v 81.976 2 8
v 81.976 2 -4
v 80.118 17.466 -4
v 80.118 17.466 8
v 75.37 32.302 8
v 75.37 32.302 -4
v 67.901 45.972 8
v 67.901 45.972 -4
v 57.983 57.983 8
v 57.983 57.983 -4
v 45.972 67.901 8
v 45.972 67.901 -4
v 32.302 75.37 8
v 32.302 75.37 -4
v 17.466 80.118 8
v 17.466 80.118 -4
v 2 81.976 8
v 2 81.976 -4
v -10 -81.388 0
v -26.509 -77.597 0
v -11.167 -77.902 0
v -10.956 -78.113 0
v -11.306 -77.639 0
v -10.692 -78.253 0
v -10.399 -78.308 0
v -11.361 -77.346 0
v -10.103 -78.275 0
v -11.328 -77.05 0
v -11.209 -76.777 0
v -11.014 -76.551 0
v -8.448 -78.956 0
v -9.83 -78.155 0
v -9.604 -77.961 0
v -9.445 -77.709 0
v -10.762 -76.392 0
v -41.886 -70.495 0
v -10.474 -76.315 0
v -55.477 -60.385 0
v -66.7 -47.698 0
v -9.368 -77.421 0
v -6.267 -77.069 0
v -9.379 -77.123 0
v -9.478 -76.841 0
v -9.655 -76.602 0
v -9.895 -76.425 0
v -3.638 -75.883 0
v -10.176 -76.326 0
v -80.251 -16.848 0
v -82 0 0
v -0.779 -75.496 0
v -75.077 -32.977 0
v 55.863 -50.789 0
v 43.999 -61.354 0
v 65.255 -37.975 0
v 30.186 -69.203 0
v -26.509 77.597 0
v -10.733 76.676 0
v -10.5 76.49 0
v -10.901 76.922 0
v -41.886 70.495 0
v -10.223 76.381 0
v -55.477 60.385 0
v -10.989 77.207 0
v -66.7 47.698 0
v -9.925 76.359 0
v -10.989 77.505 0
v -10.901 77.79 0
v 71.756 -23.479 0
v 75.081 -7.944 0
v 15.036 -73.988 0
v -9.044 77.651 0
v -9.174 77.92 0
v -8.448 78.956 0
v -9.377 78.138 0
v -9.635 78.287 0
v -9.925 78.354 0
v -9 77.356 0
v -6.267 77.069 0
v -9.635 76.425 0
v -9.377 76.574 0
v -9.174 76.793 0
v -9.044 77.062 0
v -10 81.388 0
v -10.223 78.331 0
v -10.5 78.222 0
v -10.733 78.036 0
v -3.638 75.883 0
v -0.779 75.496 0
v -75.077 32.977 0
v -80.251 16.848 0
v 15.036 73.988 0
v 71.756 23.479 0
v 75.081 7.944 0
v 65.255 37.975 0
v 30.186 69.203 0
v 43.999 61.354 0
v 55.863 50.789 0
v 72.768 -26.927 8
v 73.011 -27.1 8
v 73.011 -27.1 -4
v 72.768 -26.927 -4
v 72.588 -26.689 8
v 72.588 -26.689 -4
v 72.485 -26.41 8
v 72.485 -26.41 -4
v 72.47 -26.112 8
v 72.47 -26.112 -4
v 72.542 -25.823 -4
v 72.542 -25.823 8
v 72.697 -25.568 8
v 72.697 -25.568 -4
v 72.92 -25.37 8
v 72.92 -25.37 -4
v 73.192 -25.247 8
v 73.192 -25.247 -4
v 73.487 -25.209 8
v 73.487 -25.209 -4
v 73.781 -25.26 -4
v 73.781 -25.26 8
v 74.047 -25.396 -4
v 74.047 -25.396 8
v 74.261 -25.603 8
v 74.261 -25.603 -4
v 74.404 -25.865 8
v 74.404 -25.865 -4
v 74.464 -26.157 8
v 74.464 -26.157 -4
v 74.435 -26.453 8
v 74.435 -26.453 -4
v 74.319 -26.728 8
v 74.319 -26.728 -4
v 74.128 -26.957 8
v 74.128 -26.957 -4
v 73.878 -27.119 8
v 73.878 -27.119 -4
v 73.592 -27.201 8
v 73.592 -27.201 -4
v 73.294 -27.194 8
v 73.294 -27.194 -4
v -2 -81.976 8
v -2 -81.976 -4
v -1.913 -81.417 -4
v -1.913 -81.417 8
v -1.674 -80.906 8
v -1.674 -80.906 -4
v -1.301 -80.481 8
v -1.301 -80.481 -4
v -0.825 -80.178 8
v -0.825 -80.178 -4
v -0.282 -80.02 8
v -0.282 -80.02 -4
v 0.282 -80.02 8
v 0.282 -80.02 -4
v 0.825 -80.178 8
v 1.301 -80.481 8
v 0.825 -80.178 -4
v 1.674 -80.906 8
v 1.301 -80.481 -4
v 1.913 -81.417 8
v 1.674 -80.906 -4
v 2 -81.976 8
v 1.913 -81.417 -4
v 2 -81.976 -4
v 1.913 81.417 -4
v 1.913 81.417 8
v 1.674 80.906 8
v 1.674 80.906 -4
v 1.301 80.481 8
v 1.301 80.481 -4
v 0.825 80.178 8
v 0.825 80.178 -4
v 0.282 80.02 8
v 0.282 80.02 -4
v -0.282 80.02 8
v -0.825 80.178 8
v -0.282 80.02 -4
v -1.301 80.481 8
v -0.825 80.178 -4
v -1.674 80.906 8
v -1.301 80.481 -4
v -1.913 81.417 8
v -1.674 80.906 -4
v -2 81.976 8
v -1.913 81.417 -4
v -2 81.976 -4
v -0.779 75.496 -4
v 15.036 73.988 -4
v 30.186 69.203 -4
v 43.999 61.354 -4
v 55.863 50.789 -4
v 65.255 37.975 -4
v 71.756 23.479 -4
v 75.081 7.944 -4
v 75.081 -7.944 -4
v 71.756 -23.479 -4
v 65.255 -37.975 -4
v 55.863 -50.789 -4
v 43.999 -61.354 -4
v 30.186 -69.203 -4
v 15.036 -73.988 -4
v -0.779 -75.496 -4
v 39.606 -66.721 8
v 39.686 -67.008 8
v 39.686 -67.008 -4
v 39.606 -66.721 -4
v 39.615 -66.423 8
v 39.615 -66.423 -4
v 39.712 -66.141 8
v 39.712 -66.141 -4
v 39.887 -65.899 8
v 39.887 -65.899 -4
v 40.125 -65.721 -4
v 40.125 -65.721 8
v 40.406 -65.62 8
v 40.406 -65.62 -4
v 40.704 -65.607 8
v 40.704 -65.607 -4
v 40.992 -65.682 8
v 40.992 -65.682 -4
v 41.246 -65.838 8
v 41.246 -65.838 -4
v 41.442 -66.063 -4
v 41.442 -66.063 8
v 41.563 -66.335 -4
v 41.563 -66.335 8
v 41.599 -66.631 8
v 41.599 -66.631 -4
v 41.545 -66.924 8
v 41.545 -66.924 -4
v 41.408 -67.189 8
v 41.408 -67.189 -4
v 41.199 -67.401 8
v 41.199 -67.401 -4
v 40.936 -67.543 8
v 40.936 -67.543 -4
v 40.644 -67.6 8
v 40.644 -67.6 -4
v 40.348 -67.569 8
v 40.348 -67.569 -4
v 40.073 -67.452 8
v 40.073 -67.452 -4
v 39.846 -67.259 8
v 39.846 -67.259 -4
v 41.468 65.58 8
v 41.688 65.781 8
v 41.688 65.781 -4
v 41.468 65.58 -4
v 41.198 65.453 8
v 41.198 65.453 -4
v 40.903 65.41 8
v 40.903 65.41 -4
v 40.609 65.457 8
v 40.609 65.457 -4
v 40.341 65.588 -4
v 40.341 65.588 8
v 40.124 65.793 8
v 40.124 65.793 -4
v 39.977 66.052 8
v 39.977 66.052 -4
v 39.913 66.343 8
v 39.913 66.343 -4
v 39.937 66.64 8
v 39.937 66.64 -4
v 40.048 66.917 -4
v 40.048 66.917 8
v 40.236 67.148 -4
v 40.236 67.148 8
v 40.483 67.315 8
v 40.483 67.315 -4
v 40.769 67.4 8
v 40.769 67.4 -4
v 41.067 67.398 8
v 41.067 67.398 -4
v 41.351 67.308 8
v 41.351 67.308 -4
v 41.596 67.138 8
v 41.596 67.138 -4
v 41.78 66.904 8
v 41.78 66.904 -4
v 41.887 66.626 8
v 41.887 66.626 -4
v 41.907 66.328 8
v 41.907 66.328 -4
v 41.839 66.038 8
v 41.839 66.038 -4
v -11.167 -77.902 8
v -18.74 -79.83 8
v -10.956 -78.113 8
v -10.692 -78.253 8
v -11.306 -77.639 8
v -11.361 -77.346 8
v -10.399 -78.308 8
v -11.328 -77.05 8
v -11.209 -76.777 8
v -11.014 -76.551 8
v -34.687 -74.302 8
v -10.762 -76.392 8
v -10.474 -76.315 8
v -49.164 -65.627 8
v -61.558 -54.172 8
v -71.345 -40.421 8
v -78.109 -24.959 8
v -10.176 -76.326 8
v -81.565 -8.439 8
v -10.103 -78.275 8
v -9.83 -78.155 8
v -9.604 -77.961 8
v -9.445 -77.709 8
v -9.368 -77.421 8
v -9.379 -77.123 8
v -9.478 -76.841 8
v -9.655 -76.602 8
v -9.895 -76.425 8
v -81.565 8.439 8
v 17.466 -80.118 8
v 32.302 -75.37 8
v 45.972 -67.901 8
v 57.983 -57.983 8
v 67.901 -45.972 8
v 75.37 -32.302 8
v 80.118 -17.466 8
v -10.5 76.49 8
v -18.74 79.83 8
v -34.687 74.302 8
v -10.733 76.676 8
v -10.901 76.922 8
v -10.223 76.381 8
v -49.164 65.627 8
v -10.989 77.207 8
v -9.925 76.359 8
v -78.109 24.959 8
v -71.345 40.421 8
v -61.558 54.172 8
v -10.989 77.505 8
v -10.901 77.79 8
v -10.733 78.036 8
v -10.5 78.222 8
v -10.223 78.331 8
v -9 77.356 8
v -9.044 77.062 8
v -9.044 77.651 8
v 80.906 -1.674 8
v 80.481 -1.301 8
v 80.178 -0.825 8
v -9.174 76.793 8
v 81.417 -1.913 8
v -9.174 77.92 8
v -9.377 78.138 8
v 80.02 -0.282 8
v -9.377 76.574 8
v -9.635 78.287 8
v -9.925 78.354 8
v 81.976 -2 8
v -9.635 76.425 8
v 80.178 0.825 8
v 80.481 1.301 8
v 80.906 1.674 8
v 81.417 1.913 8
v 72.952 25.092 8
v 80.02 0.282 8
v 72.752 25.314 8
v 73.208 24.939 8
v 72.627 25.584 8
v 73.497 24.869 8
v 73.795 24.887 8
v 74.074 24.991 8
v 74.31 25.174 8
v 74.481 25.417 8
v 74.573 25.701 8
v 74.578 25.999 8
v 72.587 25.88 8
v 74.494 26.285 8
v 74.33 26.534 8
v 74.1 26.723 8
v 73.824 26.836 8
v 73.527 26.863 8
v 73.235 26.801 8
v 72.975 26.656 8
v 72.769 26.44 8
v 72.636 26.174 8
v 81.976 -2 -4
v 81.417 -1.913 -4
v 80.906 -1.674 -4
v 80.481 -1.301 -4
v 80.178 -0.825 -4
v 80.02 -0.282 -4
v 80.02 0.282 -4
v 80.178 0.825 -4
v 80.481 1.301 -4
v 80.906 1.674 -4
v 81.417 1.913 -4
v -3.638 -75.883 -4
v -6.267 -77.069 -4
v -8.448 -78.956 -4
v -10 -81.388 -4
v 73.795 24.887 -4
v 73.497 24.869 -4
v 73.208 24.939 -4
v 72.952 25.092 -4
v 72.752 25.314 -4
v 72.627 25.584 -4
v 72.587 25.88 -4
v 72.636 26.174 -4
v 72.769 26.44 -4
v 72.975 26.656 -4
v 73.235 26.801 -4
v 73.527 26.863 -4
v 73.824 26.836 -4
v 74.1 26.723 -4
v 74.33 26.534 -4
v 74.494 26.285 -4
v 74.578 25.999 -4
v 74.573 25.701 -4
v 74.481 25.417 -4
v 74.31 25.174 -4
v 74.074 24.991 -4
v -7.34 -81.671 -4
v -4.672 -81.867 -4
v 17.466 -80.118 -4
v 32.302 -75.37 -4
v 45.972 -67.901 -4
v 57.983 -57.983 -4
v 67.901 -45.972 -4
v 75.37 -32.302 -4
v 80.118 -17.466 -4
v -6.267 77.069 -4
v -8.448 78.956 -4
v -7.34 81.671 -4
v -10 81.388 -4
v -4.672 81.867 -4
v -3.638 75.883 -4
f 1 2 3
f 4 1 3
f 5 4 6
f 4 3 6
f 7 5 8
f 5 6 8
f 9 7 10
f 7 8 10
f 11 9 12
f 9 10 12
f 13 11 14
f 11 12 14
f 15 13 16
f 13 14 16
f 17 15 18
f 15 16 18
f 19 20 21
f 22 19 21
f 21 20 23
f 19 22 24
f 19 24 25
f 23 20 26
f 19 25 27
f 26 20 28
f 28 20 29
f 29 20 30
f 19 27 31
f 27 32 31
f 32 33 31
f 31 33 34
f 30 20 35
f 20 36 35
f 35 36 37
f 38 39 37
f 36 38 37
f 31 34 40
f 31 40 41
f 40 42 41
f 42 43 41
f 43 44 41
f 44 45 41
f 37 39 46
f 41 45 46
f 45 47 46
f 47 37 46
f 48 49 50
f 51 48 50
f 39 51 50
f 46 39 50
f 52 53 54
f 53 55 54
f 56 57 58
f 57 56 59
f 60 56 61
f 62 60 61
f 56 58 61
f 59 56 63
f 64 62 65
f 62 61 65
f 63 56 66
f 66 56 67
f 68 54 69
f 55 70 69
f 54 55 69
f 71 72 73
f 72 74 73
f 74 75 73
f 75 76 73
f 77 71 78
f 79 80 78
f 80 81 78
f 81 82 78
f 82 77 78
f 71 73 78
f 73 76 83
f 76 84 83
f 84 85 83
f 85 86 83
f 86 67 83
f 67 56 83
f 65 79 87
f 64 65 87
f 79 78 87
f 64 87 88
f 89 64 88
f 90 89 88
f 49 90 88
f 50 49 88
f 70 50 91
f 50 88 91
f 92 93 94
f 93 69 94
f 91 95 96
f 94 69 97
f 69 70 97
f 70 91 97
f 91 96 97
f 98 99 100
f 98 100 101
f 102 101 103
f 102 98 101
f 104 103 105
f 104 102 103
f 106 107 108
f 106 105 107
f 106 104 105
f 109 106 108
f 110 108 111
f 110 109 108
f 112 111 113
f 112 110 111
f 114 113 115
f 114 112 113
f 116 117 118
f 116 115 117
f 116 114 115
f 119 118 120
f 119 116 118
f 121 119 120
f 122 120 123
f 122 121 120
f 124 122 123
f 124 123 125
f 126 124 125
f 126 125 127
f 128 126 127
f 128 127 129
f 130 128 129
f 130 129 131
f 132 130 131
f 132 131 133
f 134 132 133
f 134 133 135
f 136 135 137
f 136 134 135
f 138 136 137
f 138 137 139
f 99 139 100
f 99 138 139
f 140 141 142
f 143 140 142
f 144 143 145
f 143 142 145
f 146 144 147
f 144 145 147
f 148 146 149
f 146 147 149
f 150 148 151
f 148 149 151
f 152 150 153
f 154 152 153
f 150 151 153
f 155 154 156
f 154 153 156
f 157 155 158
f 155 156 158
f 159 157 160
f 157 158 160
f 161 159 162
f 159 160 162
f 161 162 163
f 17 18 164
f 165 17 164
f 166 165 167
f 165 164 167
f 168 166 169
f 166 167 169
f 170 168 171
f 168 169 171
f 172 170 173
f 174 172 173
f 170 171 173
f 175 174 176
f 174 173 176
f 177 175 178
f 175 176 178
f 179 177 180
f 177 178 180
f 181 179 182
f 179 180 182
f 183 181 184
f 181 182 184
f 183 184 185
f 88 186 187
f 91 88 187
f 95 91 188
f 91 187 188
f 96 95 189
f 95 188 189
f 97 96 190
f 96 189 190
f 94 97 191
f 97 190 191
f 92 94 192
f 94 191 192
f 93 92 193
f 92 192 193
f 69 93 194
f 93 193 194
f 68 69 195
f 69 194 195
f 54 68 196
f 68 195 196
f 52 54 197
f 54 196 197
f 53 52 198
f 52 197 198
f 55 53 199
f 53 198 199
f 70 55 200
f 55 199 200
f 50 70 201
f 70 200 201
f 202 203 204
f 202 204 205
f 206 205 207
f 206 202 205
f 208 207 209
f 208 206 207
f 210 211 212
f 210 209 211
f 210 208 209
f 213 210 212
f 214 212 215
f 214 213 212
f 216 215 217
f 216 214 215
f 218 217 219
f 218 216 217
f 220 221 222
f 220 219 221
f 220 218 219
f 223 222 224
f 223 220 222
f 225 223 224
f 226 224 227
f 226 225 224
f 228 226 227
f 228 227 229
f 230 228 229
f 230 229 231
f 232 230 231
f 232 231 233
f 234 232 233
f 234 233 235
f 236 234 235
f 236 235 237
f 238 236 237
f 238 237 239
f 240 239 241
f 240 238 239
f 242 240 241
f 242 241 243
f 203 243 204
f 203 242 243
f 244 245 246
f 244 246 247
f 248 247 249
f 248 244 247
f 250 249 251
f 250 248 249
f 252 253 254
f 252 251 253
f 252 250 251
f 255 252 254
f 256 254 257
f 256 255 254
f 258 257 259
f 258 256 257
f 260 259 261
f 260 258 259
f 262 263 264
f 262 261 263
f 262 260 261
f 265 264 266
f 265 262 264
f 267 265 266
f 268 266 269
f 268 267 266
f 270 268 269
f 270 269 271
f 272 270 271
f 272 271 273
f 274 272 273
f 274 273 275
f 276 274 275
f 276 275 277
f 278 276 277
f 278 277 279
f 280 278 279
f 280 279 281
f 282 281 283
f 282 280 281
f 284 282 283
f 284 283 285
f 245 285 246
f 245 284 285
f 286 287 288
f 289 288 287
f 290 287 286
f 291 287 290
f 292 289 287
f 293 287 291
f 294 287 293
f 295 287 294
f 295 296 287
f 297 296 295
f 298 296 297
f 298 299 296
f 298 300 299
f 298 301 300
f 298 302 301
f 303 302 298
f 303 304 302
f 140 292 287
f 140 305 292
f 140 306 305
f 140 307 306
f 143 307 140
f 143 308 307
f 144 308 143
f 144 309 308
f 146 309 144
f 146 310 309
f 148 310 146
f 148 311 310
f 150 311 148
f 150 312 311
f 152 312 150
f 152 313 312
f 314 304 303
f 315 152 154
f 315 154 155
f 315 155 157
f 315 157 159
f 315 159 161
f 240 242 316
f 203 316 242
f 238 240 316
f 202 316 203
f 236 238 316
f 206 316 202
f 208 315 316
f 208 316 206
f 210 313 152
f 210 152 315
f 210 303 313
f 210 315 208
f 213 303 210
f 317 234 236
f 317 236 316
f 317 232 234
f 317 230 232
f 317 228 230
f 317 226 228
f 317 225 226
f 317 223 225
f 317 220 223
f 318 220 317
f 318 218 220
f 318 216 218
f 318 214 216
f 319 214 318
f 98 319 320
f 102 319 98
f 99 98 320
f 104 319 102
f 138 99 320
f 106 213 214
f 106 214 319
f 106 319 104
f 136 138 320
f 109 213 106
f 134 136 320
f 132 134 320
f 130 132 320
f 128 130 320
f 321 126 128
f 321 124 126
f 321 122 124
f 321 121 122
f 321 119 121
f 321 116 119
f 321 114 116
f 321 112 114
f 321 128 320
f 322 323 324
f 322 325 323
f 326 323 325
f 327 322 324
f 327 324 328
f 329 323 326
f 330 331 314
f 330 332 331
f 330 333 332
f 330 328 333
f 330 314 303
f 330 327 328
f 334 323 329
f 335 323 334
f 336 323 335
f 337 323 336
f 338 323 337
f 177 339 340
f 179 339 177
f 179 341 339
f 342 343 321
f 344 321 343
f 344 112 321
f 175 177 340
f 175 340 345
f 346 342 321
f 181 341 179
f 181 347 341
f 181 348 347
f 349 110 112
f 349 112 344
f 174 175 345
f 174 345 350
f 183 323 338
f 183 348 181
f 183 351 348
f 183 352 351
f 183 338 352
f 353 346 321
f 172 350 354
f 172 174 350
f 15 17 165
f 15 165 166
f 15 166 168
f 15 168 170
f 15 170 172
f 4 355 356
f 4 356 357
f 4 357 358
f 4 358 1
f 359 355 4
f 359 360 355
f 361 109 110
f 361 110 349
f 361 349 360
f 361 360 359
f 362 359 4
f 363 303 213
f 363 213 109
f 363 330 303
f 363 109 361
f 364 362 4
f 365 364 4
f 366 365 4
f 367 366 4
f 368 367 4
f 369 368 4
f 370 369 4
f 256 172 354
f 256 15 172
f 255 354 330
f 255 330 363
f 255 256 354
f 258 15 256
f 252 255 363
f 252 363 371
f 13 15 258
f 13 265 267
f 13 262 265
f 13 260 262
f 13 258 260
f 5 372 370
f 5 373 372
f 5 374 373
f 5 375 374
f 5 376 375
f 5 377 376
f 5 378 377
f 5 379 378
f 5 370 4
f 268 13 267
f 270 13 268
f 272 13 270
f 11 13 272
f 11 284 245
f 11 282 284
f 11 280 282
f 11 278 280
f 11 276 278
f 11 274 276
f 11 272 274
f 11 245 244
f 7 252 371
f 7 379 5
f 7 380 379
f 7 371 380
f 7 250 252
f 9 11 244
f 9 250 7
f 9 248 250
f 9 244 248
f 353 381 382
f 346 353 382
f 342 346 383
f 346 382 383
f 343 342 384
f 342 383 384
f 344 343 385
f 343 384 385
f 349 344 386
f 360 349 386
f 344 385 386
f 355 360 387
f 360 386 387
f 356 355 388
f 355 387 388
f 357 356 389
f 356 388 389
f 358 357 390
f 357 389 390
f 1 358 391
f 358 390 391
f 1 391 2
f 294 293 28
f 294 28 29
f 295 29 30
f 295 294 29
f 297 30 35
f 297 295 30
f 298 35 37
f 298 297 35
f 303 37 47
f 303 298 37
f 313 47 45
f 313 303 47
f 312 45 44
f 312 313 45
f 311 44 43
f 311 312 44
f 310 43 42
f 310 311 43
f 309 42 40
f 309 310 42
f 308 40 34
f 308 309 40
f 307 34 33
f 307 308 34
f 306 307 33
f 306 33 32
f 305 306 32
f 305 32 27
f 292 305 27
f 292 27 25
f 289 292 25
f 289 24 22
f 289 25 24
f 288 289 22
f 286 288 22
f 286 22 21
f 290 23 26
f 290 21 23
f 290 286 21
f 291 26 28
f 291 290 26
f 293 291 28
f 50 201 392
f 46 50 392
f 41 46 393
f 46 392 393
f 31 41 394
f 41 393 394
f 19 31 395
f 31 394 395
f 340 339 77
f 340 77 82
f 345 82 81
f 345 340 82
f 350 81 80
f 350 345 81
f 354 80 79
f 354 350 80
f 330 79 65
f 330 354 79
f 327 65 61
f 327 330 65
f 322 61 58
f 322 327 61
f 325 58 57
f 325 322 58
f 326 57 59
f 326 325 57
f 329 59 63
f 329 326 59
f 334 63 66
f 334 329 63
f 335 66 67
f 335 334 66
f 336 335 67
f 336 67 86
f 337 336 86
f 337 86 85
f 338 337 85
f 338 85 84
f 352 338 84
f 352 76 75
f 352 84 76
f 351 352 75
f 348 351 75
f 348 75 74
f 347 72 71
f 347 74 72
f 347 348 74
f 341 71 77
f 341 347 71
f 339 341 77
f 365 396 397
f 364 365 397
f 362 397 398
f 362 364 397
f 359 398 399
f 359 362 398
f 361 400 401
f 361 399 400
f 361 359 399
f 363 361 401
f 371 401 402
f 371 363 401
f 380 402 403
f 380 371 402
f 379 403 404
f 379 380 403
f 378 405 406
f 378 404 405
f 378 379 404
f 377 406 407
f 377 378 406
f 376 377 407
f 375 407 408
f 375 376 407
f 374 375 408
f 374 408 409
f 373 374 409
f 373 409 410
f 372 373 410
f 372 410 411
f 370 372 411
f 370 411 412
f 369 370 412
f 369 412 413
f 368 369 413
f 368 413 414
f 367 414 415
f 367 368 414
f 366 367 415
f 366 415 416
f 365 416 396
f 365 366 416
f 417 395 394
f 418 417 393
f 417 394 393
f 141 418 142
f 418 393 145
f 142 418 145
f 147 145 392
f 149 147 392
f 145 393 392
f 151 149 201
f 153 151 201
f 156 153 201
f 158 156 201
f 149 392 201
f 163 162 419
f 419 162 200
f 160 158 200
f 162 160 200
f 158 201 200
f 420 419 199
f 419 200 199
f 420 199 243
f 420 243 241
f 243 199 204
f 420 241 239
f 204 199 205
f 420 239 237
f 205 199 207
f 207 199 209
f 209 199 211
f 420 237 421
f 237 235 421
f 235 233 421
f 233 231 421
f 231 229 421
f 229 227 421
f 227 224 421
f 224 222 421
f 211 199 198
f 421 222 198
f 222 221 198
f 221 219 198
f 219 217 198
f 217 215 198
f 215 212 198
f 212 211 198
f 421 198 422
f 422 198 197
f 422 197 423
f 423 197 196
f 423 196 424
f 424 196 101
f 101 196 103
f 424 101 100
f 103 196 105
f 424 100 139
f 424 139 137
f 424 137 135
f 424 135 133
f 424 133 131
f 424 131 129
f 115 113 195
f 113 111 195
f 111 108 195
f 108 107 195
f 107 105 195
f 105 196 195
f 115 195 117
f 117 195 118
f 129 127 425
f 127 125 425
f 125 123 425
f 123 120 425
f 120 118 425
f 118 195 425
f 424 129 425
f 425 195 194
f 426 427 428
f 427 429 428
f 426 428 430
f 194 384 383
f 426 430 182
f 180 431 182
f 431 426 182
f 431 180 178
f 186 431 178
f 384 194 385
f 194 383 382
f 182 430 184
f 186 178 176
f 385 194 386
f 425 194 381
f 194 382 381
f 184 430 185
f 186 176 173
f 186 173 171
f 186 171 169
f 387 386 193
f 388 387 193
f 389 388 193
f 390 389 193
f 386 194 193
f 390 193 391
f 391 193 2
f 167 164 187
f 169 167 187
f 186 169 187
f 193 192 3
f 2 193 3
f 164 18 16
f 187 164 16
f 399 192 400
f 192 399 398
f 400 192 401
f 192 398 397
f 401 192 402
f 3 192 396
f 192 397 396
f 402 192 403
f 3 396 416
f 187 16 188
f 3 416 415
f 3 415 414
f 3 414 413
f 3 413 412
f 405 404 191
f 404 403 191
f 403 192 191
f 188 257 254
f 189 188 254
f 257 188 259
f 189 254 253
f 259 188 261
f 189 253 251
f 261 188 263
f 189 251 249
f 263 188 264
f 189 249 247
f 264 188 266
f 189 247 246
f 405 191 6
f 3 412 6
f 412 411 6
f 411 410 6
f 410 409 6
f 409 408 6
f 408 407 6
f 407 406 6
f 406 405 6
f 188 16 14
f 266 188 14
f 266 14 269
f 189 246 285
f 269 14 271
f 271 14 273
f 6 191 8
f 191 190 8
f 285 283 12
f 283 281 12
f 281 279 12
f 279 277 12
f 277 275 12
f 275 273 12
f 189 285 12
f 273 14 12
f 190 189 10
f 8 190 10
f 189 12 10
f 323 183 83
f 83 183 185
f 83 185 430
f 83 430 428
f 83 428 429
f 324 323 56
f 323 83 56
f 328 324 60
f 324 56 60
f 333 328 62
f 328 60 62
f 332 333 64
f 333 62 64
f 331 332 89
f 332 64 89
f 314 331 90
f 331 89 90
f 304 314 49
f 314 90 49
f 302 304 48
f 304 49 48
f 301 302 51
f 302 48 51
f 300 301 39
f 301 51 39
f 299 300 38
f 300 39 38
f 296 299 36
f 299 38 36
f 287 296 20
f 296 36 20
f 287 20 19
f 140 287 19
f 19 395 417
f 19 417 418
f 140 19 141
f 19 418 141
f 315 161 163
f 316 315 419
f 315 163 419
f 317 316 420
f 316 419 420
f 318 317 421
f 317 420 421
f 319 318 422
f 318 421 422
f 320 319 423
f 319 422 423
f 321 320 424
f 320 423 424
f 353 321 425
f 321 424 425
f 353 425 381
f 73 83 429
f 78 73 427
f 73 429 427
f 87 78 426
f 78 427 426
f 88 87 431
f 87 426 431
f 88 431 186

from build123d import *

# Parameters (mm, degrees)
SKETCH1_R           = 82
BOSS_EXTRUDE1_DEPTH = 8
BOSS_EXTRUDE3_START = 4
BOSS_EXTRUDE3_DEPTH = 4
FILLET1_R           = 10
SKETCH8_R           = 2
CUT_EXTRUDE4_DEPTH  = 12
CIRPATTERN4_COUNT   = 3
CIRPATTERN4_ANGLE   = 180
CUT_EXTRUDE5_START  = -12
SKETCH9_R           = 1
CUT_EXTRUDE5_DEPTH  = 38
CIRPATTERN5_COUNT   = 6
CIRPATTERN5_ANGLE   = 195


with BuildPart() as part:
    # Sketch1 → Boss-Extrude1 (new body)
    with BuildSketch(Plane.XY):
        Circle(SKETCH1_R)
    extrude(amount=BOSS_EXTRUDE1_DEPTH)

    # Sketch3 → Boss-Extrude3 (add)
    with BuildSketch(Plane(origin=(0, 0, 0), x_dir=(-1, 0, 0), z_dir=(0, 0, -1)).offset(BOSS_EXTRUDE3_START)):
        with BuildLine():
            Line((10, 81.387959798), (10, 74.8348181))
            ThreePointArc((10, 74.8348181), (-75.5, 0), (10, -74.8348181))
            Line((10, -74.8348181), (10, -81.387959798))
            ThreePointArc((10, -81.387959798), (-82, 0), (10, 81.387959798))
        make_face()
    extrude(amount=-BOSS_EXTRUDE3_DEPTH)

    # Fillet1
    # the kernel refuses this fillet: 10 mm, written as the material it takes off along each edge
    with BuildSketch(Plane(origin=(-10, 74.8348181, -27.110945108), x_dir=(0, 1, 0), z_dir=(0, 0, 1))) as fillet1_piece_1:
        with BuildLine():
            CenterArc((10.660627219, -9.117486644), FILLET1_R, 114.251866349, 66.339539365)
            ThreePointArc((0.66115993, -9.22070458), (0.471837745, -4.600223565), (0, 0))
            Line((0, 0), (6.553141698, 0))
        make_face()
    extrude(amount=27.110945108, mode=Mode.SUBTRACT)
    with BuildSketch(Plane(origin=(-10, -74.8348181, -27.110945108), x_dir=(0, -1, 0), z_dir=(0, 0, 1))) as fillet1_piece_2:
        with BuildLine():
            CenterArc((10.660627219, 9.117486644), FILLET1_R, 179.408594286, 66.339539365)
            ThreePointArc((0.66115993, 9.22070458), (0.471837745, 4.600223565), (0, 0))
            Line((0, 0), (6.553141698, 0))
        make_face()
    extrude(amount=27.110945108, mode=Mode.SUBTRACT)

    # Sketch8 → Cut-Extrude4 (cut)
    with BuildSketch(Plane(origin=(0, 0, -4), x_dir=(-1, 0, 0), z_dir=(0, 0, -1))):
        with Locations((0, 82)):
            Circle(SKETCH8_R)
    cut_extrude4 = extrude(amount=-CUT_EXTRUDE4_DEPTH, mode=Mode.SUBTRACT)

    # CirPattern4: Cut-Extrude4 ×3 about axis
    cirpattern4_axis = Axis((0, 0, 0), (0, 0, -1))
    for i in range(1, CIRPATTERN4_COUNT):
        add(cut_extrude4.rotate(cirpattern4_axis, i * CIRPATTERN4_ANGLE / (CIRPATTERN4_COUNT - 1)), mode=Mode.SUBTRACT)

    # Sketch9 → Cut-Extrude5 (cut)
    with BuildSketch(Plane(origin=(0, 0, 0), x_dir=(-1, 0, 0), z_dir=(0, 0, -1)).offset(CUT_EXTRUDE5_START)):
        with Locations(Location((10, 77.356318423, 0), (0, 0, 180))):
            Circle(SKETCH9_R)
    cut_extrude5 = extrude(amount=CUT_EXTRUDE5_DEPTH, mode=Mode.SUBTRACT)

    # CirPattern5: Cut-Extrude5 ×6 about axis
    cirpattern5_axis = Axis((0, 0, 0), (0, 0, -1))
    for i in range(1, CIRPATTERN5_COUNT):
        add(cut_extrude5.rotate(cirpattern5_axis, i * CIRPATTERN5_ANGLE / (CIRPATTERN5_COUNT - 1)), mode=Mode.SUBTRACT)


solid = part.part
